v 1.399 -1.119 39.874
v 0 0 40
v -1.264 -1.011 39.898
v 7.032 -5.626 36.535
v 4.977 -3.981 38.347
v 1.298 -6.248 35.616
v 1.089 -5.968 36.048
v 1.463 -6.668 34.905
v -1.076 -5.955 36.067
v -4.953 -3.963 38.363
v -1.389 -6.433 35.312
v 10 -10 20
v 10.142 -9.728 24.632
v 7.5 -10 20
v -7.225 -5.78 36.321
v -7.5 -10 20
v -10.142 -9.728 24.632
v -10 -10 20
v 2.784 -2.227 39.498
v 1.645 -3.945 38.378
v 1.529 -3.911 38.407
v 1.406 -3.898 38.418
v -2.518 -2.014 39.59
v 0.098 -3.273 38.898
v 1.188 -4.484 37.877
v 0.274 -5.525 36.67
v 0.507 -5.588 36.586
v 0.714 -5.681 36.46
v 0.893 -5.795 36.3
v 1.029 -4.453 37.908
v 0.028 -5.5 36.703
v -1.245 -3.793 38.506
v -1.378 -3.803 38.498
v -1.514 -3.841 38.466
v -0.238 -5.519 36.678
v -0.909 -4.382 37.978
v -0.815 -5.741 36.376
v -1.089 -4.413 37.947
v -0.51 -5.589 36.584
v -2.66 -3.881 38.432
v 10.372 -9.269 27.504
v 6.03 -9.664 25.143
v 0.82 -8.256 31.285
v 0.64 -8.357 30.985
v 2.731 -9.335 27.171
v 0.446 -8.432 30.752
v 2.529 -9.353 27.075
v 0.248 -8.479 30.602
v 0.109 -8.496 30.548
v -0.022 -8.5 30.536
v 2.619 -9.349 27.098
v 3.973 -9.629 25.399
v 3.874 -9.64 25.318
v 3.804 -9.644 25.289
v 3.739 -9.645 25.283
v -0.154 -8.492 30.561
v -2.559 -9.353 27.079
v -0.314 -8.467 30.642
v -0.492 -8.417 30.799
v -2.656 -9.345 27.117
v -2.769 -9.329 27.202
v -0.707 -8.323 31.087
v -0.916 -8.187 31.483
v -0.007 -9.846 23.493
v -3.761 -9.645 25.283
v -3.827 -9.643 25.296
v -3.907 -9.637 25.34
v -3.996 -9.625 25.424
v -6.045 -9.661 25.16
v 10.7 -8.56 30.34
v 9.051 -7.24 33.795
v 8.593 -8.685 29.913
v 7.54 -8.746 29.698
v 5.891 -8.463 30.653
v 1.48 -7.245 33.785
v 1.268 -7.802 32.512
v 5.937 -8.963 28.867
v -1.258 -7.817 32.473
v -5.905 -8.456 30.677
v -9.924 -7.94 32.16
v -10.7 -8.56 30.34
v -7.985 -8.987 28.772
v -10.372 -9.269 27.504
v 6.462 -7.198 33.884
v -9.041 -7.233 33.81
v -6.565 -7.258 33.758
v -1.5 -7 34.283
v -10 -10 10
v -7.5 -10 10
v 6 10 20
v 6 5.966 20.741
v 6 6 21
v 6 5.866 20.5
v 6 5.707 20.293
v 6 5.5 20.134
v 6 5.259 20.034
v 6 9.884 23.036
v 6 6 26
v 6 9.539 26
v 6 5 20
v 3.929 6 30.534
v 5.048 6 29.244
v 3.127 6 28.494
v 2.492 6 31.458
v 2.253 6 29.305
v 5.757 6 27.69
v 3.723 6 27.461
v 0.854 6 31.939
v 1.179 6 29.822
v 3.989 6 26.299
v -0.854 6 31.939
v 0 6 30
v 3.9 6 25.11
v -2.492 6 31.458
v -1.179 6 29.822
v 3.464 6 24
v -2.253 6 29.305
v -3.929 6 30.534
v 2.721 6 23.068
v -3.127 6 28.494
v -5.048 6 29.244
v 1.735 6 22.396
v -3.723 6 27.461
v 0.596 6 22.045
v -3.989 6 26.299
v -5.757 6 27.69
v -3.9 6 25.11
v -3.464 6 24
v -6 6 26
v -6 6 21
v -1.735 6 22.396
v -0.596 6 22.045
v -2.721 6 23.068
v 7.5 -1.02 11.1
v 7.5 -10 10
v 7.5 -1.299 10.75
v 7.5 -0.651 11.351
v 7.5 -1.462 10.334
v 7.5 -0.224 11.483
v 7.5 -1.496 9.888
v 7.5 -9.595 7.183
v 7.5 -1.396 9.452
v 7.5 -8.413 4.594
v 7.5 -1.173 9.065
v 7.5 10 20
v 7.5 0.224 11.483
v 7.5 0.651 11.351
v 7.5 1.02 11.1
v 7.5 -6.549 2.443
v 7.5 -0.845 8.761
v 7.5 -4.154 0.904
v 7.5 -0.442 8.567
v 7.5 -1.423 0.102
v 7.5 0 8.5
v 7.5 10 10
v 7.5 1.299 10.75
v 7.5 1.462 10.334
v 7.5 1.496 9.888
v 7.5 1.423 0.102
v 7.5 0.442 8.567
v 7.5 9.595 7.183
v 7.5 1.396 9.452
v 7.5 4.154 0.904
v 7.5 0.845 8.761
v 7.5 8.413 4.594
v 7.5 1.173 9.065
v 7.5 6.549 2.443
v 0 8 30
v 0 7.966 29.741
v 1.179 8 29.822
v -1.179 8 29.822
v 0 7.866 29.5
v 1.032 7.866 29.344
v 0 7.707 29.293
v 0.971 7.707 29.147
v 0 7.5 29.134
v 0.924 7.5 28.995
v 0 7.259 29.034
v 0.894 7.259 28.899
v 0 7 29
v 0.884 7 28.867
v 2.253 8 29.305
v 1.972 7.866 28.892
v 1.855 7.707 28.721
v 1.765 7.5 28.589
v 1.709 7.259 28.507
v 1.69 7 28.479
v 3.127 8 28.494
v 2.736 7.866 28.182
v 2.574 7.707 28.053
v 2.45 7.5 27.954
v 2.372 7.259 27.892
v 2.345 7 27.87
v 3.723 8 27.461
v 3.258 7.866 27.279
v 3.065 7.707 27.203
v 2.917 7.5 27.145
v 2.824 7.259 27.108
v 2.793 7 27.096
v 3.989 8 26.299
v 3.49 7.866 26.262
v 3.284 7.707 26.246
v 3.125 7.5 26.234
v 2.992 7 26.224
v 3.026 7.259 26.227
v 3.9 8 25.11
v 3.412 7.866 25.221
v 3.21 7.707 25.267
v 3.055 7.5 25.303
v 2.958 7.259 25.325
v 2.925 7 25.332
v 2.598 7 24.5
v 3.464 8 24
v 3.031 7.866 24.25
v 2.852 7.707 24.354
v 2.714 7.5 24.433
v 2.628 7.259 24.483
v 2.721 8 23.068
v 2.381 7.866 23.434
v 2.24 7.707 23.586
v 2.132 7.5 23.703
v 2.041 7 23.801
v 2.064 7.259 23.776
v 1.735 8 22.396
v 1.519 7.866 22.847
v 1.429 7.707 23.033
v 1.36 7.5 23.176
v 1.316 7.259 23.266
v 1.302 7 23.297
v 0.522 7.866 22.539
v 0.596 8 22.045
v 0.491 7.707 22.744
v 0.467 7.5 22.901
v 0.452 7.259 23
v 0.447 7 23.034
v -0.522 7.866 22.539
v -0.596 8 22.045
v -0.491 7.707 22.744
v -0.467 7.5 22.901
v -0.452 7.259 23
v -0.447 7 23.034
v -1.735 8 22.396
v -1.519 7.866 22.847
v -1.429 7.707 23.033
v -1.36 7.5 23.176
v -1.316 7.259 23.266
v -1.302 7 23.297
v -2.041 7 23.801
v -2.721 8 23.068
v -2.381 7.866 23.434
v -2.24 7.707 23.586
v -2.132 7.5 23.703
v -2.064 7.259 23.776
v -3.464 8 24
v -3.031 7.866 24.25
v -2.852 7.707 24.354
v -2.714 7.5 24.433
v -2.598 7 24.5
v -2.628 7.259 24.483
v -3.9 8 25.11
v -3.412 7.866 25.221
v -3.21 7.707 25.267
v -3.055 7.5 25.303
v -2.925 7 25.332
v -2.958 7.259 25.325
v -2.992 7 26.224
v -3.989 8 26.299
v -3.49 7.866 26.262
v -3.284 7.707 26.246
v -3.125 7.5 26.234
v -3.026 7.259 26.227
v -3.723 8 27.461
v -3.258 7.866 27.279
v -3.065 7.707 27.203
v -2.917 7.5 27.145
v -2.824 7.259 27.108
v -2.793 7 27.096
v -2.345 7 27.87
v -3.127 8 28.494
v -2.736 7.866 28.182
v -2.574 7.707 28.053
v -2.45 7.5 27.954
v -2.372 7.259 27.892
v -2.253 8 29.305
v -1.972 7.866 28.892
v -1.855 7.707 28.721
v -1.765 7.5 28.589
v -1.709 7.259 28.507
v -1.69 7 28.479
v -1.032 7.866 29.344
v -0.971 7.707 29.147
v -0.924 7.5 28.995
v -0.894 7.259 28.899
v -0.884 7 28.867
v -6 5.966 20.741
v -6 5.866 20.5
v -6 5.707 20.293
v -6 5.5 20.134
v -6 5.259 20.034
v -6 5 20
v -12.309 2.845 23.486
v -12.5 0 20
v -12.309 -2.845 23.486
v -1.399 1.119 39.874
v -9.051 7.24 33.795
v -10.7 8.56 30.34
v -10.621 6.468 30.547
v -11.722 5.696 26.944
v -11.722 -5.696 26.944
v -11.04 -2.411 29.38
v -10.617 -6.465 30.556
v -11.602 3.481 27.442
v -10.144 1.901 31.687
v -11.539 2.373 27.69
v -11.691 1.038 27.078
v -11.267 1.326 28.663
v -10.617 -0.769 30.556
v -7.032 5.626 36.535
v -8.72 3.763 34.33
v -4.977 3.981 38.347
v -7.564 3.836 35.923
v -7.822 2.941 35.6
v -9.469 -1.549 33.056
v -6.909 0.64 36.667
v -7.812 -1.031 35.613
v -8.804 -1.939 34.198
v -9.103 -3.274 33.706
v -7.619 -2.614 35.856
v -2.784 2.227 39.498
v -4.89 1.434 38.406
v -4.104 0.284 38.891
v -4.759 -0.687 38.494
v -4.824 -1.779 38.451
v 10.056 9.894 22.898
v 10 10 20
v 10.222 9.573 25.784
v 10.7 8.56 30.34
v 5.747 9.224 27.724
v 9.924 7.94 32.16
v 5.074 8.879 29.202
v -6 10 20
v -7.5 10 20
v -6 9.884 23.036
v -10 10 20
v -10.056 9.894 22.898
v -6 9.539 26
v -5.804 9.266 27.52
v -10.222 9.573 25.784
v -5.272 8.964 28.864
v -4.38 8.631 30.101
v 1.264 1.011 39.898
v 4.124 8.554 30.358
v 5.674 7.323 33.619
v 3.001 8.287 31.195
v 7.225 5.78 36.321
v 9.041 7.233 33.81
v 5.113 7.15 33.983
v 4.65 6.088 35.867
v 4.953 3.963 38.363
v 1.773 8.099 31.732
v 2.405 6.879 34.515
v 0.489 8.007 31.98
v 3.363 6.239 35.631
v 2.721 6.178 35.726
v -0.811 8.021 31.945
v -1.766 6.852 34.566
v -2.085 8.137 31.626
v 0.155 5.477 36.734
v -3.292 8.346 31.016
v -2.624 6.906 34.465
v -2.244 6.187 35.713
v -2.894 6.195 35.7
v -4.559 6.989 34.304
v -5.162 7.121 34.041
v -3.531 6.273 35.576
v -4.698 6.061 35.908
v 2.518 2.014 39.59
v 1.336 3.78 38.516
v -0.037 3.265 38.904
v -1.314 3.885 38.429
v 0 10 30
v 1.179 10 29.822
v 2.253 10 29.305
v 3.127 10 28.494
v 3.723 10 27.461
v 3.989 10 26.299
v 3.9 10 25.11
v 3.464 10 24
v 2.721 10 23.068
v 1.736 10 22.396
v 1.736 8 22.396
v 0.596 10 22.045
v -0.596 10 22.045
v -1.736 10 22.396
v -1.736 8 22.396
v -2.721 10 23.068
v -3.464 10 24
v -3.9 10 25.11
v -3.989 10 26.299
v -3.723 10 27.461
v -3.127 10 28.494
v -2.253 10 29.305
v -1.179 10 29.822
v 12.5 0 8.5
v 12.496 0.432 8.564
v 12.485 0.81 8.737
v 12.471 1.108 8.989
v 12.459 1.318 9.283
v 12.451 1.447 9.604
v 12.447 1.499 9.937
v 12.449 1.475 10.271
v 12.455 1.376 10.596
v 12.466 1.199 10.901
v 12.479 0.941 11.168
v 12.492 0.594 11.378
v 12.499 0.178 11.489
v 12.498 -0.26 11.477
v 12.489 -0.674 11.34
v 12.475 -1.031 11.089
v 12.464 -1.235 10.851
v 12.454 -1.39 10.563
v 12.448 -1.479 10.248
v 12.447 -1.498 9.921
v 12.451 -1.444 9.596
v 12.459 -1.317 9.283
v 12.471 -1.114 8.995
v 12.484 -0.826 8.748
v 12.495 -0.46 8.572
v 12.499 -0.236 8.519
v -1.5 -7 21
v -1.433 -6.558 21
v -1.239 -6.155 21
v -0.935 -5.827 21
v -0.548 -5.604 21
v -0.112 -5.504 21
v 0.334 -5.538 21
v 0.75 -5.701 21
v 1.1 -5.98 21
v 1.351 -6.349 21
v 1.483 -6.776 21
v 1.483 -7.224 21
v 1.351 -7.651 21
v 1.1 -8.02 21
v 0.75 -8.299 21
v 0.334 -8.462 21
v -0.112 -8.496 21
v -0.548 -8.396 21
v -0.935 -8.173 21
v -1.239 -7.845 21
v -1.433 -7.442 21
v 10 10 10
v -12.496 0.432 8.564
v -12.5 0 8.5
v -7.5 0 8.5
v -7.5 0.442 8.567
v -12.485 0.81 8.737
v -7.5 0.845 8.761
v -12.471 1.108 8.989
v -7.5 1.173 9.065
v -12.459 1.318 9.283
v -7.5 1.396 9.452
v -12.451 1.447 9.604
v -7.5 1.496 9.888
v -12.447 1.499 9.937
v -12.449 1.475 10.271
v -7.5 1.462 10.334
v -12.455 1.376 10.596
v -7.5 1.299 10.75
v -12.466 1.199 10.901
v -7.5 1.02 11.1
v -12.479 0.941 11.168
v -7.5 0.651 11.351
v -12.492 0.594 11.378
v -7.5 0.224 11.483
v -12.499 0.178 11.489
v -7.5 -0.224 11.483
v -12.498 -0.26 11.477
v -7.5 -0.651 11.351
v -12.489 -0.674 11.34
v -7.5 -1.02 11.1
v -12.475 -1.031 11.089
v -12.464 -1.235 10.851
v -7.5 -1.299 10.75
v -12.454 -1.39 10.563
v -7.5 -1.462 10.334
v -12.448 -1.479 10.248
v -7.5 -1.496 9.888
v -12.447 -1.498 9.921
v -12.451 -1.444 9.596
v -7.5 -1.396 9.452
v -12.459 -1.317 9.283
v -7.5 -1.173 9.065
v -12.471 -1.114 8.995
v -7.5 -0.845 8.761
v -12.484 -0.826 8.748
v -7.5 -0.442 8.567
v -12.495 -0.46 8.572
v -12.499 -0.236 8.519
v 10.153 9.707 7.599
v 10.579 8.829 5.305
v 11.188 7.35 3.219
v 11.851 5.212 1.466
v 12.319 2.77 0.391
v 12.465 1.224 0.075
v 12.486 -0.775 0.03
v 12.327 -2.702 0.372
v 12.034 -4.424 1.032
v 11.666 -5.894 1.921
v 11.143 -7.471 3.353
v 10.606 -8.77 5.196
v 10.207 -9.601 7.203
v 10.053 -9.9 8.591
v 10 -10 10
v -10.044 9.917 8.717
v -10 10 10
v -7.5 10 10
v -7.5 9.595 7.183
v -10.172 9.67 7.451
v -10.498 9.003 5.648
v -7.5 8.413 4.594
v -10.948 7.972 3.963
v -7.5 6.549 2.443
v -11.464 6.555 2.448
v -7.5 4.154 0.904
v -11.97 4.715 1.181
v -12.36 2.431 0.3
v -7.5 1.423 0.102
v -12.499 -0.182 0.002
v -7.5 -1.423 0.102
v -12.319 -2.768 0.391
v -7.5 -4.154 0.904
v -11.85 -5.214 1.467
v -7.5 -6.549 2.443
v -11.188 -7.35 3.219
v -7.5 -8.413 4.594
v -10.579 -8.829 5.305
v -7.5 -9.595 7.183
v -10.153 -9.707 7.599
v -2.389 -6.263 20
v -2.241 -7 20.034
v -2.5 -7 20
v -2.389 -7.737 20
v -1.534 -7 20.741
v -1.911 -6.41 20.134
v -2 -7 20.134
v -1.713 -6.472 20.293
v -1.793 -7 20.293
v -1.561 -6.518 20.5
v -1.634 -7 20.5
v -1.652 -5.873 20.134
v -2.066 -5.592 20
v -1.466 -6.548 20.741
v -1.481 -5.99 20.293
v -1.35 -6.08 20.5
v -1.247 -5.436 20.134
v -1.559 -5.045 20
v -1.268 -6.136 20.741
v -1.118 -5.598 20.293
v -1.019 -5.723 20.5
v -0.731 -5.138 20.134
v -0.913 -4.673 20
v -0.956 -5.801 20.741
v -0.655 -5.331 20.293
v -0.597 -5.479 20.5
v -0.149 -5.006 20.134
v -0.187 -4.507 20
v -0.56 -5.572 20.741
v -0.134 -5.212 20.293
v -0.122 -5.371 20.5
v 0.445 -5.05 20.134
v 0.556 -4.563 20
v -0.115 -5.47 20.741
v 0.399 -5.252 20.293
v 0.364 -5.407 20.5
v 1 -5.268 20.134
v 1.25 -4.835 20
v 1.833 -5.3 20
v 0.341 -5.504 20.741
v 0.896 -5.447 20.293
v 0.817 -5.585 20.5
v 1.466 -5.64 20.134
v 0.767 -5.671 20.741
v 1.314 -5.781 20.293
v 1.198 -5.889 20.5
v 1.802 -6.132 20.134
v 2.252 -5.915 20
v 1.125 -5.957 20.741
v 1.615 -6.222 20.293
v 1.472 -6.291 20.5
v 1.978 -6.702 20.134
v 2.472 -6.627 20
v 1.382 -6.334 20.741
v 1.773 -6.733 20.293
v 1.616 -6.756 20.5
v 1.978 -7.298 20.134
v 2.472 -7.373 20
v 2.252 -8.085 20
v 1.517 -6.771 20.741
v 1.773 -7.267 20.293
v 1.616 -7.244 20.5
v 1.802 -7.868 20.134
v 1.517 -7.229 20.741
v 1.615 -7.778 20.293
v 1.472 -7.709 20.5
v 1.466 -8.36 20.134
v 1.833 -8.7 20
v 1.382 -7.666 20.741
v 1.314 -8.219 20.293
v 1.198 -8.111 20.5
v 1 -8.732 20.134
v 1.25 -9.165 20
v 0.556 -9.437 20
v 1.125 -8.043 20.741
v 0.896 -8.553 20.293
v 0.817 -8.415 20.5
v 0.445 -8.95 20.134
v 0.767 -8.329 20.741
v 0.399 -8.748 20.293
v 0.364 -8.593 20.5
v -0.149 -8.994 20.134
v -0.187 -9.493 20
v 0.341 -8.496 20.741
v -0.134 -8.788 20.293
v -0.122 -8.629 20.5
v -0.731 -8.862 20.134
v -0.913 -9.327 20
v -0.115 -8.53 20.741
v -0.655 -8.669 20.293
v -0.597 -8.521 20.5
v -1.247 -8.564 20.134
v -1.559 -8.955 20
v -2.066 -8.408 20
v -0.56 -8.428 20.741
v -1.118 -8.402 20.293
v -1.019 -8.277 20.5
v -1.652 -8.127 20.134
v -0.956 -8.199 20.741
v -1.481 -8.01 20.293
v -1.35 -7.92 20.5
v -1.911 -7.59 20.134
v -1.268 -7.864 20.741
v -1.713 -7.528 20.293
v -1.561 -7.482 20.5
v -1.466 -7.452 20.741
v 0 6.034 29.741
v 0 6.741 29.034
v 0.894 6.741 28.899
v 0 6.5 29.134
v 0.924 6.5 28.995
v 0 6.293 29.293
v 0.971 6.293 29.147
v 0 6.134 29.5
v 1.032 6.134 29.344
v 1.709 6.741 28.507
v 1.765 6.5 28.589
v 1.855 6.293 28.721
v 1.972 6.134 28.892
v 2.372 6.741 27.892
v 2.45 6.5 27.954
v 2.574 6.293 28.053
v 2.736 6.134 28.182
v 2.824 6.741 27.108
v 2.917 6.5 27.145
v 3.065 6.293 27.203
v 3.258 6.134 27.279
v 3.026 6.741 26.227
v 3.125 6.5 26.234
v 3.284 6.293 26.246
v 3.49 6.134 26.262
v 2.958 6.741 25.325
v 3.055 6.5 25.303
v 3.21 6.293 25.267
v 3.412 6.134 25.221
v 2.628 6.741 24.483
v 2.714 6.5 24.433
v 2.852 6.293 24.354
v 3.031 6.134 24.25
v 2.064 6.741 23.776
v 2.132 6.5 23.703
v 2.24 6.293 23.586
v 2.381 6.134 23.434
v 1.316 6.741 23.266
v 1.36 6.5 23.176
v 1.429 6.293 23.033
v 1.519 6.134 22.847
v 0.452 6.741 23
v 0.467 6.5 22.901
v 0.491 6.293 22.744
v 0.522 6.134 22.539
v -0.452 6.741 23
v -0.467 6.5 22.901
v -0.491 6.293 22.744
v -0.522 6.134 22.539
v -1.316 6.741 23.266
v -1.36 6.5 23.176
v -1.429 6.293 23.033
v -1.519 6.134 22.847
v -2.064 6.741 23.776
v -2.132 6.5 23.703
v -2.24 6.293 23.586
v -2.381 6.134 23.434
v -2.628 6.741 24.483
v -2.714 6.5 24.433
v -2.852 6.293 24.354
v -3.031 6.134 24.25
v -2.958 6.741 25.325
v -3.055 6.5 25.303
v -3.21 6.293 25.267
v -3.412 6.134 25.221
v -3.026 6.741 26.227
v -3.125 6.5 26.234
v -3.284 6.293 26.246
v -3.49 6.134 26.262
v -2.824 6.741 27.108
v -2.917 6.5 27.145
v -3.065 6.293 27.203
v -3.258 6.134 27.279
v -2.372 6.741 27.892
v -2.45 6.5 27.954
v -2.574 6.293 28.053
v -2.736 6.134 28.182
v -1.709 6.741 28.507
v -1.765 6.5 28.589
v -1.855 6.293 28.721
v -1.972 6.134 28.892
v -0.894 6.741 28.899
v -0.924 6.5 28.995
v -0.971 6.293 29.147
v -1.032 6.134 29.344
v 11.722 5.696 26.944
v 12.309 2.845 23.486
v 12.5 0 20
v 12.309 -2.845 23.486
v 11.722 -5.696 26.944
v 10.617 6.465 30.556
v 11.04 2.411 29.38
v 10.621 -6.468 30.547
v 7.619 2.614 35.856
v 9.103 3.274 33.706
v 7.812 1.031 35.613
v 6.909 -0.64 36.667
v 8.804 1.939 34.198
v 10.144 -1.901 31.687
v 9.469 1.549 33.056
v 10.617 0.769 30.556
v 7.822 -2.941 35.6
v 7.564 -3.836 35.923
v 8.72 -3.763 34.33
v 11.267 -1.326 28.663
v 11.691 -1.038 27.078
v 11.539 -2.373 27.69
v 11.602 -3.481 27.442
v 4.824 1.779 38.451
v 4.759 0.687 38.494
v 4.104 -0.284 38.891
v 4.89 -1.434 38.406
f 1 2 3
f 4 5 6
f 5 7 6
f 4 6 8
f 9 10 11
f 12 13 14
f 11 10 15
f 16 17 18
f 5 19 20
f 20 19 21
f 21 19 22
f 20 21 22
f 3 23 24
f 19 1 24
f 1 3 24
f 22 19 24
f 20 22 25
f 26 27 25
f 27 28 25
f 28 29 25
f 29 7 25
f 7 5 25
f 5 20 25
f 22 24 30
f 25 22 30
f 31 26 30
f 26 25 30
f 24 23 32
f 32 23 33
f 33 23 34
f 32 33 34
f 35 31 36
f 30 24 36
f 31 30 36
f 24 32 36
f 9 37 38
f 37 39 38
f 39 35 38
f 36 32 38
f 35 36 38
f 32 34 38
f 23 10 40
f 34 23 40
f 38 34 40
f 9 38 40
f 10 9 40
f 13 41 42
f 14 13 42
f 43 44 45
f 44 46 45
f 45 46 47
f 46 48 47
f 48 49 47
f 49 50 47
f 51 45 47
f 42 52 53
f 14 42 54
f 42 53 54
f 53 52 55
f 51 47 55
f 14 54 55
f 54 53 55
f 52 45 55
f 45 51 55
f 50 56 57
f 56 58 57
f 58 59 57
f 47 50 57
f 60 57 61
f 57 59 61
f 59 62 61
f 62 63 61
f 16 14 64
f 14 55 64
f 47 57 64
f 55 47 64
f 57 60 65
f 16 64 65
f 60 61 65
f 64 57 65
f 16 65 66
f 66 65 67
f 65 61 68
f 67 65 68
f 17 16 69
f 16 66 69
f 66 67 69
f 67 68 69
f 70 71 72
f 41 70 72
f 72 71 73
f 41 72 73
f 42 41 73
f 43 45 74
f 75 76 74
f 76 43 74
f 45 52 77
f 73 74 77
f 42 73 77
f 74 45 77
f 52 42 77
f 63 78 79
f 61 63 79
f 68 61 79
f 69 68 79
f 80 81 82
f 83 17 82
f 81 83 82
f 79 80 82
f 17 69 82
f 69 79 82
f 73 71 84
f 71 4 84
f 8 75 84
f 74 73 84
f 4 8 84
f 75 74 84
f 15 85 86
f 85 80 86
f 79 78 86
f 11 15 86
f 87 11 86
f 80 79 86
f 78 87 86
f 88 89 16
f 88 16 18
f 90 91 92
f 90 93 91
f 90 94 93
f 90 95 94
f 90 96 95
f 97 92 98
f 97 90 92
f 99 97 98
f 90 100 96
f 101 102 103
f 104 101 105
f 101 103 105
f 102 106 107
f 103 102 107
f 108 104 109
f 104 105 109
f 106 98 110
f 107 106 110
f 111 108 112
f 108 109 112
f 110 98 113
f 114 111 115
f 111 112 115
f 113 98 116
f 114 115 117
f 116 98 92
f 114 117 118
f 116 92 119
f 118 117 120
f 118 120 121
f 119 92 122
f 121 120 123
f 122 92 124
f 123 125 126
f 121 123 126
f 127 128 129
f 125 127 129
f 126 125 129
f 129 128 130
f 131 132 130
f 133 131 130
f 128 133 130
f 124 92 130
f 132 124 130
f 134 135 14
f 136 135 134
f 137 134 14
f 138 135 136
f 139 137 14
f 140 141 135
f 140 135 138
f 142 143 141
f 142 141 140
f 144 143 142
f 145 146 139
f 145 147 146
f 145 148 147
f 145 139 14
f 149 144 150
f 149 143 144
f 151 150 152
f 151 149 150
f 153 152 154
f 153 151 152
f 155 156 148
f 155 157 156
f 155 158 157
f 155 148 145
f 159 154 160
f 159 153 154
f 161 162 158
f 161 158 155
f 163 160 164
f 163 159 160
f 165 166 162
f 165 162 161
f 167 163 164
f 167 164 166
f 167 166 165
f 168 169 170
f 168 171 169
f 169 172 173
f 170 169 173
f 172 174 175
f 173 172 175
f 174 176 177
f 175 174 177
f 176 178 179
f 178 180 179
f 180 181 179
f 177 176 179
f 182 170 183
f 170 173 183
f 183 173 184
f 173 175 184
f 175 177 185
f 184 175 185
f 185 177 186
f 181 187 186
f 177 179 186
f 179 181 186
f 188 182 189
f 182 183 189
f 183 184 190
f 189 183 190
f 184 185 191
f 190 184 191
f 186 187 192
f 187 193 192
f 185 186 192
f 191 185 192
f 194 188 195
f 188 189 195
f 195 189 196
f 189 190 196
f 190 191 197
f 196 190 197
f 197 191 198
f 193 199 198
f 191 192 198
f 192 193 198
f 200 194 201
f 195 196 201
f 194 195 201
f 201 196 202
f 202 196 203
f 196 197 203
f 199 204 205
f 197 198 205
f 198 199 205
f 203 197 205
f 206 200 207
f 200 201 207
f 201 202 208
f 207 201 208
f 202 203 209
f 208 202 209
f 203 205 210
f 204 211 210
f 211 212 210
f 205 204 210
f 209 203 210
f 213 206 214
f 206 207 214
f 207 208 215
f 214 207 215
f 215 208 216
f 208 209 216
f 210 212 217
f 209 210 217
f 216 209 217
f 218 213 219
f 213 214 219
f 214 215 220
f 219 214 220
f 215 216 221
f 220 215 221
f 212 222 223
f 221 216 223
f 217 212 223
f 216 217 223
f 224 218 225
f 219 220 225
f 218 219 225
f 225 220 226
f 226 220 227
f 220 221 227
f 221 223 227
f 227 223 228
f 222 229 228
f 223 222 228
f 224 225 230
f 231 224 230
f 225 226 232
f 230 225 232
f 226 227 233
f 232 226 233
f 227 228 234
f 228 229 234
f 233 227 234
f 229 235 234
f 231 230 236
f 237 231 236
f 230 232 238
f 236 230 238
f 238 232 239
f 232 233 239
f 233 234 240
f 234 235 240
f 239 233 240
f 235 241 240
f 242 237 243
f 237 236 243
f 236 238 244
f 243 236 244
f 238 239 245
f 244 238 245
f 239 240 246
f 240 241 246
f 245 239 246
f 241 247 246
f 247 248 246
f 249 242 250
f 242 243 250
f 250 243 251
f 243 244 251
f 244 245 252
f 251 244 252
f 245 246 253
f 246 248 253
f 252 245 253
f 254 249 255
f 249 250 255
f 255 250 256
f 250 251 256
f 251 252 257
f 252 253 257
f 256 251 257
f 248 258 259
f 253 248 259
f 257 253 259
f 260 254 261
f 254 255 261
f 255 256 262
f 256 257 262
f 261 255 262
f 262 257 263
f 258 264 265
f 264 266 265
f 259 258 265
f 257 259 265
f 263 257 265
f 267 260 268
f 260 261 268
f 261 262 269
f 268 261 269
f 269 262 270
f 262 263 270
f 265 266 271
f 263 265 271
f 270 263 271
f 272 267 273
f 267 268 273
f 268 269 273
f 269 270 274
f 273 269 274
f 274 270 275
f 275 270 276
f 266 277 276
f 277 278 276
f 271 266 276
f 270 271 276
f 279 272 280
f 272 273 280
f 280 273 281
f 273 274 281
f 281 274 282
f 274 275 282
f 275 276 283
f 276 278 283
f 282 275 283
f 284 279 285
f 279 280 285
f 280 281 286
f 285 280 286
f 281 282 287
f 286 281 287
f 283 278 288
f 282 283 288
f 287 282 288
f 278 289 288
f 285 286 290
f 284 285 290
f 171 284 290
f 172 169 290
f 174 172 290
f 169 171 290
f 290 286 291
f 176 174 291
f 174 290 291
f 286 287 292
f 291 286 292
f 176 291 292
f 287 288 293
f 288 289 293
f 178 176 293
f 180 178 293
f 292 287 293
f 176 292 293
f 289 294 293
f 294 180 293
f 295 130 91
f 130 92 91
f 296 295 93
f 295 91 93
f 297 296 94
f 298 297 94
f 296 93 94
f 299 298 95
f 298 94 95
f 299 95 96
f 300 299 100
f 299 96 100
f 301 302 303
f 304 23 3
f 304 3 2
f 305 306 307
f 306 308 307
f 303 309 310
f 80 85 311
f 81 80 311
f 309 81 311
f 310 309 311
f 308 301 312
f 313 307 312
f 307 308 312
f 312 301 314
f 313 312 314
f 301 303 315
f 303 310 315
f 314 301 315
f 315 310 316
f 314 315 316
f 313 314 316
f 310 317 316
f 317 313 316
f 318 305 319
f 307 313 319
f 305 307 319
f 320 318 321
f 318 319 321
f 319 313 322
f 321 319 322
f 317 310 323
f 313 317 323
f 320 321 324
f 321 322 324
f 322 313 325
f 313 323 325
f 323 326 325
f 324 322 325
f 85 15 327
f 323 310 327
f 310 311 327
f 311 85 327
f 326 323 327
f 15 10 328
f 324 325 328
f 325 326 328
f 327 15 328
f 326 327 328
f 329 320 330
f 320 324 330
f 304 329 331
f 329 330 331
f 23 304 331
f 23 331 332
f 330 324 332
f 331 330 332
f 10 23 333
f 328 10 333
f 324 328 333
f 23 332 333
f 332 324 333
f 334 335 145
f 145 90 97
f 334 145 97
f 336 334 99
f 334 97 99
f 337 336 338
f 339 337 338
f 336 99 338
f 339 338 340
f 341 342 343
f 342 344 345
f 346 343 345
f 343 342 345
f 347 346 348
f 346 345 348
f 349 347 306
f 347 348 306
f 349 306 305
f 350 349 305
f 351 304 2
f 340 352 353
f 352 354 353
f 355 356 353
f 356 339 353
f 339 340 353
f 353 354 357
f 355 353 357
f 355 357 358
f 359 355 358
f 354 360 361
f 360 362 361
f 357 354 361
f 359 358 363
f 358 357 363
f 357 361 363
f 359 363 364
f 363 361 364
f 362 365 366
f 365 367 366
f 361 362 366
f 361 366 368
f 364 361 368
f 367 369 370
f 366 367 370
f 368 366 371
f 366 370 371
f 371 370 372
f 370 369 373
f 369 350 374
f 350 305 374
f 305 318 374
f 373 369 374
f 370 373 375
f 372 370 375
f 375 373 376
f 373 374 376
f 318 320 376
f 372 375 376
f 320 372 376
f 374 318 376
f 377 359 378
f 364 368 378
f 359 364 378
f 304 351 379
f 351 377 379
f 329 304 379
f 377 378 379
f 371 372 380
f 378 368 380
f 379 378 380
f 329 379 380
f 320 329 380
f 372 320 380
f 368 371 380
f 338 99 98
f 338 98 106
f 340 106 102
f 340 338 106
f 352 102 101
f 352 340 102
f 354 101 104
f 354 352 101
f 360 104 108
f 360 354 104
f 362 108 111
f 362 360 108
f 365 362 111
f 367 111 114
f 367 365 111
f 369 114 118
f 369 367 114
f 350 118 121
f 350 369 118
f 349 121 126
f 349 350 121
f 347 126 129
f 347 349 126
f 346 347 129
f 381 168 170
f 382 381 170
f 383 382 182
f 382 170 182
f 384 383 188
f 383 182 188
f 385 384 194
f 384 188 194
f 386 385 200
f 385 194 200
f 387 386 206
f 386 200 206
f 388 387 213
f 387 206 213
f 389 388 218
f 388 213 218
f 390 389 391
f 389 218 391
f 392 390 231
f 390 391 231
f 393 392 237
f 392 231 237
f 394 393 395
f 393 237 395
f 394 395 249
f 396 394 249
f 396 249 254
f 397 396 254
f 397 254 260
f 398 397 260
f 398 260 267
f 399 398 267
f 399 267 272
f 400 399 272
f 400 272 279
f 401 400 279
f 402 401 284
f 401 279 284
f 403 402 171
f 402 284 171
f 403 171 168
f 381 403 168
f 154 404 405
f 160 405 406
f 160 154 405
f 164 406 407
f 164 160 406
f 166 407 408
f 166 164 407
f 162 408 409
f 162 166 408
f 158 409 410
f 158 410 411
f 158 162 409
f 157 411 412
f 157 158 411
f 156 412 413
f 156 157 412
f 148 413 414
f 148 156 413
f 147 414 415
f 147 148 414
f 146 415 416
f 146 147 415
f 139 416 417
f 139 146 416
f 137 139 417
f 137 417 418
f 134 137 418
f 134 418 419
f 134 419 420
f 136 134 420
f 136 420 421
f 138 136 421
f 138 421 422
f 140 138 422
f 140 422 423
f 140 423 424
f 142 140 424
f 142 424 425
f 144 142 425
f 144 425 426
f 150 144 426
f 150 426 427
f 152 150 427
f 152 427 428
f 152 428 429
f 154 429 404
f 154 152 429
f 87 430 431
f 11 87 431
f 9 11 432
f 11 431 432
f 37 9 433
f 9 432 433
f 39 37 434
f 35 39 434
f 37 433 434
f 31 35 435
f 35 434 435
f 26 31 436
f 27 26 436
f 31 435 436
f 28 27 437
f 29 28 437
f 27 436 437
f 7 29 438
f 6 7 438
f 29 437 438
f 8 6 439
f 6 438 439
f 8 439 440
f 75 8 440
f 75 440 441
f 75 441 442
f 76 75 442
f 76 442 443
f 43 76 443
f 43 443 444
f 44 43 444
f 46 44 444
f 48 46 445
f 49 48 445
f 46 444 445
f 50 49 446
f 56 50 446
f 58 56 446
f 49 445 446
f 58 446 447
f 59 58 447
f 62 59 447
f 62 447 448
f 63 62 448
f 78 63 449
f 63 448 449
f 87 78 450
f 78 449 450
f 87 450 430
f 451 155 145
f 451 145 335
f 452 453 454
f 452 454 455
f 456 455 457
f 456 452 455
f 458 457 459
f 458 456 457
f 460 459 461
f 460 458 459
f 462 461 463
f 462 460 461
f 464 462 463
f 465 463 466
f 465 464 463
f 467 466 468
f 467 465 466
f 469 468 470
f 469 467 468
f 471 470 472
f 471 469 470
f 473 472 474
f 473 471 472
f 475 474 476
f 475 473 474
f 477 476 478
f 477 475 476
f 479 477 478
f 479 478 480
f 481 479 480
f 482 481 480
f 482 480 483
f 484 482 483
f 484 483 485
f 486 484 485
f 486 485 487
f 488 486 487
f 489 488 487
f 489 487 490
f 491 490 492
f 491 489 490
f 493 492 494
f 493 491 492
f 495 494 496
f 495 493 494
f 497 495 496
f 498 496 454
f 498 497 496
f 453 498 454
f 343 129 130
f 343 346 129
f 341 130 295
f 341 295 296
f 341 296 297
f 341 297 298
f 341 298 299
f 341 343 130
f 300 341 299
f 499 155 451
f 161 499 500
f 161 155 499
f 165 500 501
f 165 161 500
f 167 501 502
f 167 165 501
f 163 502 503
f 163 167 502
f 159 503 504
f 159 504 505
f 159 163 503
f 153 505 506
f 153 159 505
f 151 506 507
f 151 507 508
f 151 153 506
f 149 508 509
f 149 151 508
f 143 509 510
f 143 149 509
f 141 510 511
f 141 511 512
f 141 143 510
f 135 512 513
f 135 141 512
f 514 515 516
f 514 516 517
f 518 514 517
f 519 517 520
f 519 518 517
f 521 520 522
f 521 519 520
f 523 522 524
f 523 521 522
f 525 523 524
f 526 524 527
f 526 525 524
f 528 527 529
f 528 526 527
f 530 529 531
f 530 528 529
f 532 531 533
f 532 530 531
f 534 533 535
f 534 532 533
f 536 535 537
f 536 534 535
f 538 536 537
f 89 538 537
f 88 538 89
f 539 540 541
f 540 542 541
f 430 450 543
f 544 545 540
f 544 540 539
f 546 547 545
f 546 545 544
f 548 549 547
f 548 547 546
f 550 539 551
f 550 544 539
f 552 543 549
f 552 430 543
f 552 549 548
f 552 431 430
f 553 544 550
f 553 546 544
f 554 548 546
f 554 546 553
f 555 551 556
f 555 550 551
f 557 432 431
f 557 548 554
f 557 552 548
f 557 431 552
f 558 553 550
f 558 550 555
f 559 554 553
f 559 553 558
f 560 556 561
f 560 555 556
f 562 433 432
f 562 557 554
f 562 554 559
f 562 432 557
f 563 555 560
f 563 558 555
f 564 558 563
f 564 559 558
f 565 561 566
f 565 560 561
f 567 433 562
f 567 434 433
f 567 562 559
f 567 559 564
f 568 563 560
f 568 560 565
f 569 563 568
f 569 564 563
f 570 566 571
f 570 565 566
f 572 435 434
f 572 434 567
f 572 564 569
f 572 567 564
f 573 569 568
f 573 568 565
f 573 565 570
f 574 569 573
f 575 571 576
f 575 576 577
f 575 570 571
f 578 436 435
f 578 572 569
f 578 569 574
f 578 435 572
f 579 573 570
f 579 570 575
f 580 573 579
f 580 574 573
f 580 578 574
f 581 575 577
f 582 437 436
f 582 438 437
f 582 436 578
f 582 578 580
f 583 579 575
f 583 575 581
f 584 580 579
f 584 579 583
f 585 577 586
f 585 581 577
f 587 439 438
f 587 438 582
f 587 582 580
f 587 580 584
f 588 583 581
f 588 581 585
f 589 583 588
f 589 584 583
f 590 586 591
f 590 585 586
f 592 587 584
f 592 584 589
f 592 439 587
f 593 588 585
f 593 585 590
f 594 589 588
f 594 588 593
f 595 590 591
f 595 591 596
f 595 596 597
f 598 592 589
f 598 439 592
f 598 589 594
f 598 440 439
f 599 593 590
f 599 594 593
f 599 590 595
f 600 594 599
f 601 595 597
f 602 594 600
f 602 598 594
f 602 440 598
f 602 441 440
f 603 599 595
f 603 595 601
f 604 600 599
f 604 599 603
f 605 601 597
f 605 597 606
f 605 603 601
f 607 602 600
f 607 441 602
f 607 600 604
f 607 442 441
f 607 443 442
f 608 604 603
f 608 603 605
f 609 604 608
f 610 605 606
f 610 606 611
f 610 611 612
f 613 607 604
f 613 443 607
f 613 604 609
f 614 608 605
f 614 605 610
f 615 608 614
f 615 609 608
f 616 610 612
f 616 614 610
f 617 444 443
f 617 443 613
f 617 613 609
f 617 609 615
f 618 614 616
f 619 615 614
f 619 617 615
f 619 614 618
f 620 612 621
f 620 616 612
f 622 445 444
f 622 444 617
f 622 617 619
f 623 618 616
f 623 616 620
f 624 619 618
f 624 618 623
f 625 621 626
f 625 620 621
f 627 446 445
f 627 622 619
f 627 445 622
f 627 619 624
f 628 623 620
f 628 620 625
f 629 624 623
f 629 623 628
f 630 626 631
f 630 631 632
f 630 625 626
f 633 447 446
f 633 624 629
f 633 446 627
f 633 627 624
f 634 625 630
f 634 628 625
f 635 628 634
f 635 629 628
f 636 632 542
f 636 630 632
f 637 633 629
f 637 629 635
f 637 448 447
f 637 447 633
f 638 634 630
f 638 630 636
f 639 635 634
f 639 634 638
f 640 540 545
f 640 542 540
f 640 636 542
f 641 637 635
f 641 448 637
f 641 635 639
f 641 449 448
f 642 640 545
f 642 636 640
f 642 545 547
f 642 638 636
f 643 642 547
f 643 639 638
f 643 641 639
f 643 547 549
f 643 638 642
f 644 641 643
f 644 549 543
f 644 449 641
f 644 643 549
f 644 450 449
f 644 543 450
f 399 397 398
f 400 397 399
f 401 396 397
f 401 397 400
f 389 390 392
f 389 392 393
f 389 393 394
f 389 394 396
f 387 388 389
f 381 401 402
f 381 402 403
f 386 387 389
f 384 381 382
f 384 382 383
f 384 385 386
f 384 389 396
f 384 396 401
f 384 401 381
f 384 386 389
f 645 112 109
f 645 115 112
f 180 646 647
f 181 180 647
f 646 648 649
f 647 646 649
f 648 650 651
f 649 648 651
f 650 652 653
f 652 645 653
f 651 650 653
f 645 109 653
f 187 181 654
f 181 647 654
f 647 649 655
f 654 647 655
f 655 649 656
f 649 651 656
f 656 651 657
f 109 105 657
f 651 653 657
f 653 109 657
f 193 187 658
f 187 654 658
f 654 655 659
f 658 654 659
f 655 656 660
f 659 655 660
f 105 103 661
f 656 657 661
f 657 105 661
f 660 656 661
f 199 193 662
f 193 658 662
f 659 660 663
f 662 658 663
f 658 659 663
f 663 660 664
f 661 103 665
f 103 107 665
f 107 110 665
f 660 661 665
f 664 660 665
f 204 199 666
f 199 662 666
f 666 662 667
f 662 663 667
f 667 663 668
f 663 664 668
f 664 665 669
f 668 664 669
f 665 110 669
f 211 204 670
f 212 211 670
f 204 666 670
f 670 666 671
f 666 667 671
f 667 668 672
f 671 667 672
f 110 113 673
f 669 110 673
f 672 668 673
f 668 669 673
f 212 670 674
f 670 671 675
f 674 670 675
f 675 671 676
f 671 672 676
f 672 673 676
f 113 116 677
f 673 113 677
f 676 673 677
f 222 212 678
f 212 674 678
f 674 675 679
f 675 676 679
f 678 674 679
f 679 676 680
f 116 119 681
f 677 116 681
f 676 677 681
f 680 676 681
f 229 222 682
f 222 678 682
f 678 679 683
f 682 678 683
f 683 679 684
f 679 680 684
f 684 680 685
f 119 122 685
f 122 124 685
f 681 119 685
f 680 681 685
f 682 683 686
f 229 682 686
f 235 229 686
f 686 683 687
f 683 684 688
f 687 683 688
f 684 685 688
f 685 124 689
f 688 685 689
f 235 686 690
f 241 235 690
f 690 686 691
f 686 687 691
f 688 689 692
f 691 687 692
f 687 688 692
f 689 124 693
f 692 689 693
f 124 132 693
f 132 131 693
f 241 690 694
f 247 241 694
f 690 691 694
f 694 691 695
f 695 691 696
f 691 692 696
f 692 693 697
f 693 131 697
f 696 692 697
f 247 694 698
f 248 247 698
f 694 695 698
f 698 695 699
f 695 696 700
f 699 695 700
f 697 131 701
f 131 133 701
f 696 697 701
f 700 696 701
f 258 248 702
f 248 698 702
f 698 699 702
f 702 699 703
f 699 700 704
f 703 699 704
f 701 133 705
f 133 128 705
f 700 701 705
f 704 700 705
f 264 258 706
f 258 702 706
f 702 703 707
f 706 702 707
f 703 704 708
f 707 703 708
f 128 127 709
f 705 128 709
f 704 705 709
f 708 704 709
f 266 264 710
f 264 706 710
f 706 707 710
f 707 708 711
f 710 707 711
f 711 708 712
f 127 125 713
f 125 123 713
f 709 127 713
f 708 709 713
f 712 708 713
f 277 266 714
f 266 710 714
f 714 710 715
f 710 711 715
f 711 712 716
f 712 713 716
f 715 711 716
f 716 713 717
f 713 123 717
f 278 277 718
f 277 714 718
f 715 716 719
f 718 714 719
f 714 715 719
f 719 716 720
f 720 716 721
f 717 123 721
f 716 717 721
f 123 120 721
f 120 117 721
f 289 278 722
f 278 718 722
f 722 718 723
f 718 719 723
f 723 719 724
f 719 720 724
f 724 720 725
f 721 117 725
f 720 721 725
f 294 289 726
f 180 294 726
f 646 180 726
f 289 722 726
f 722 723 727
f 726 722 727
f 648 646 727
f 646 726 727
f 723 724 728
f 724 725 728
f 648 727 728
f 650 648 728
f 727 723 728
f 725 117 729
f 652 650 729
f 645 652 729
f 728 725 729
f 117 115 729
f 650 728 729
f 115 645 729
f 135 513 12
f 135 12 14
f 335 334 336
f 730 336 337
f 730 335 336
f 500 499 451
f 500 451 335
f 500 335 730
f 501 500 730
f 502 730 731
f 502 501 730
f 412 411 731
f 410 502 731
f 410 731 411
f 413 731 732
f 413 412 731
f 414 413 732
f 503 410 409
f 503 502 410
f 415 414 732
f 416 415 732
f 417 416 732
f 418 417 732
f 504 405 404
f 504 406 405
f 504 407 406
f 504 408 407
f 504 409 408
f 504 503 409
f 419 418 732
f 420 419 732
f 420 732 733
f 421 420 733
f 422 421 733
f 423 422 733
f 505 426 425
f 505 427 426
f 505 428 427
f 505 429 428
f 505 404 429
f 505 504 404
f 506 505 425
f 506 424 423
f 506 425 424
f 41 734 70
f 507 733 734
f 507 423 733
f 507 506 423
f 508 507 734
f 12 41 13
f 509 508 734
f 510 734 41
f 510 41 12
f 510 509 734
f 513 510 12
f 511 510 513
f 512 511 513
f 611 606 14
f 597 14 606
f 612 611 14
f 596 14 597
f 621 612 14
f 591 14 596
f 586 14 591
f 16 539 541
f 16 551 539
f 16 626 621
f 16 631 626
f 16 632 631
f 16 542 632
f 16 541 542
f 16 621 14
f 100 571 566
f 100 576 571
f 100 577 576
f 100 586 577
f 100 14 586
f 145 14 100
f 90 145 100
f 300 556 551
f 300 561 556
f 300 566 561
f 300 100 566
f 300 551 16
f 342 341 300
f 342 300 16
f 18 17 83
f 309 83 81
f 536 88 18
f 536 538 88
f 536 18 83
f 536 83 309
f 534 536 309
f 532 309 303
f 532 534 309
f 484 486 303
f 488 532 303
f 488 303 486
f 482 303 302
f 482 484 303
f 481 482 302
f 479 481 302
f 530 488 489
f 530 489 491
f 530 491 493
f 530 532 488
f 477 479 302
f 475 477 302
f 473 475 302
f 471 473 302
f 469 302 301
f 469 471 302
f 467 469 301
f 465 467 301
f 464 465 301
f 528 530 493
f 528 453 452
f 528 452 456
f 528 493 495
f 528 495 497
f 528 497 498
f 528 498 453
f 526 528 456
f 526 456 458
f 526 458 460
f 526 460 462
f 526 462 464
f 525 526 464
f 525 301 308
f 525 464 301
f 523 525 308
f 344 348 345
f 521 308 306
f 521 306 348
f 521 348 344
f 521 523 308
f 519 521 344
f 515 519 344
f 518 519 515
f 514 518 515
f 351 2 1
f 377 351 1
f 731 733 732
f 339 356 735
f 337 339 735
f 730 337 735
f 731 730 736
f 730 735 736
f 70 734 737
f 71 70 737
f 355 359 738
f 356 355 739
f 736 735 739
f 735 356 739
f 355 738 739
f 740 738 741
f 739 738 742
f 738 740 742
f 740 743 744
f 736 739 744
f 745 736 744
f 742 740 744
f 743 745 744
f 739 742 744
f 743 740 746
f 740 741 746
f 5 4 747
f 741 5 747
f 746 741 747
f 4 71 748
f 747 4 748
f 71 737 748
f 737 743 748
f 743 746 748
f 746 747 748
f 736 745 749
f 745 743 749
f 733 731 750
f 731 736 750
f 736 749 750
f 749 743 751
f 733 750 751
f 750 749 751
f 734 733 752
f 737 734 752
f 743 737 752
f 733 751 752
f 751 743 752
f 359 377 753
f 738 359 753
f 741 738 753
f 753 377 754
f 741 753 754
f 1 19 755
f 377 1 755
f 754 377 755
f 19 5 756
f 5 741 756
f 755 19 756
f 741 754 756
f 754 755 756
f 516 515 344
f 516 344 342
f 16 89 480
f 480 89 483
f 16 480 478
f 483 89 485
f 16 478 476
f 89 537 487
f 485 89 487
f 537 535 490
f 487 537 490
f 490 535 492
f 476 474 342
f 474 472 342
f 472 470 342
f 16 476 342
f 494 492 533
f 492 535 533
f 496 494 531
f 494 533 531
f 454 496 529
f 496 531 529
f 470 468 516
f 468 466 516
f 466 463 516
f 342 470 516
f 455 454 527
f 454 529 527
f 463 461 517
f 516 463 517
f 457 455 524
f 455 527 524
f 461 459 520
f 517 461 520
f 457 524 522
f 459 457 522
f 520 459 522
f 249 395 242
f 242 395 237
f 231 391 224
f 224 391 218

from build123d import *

# Parameters (mm, degrees)
SALIENTE_EXTRUIR1_DEPTH    = 40
CROQUIS3_R                 = 1.5
CORTAR_EXTRUIR2_DEPTH      = 40
CROQUIS2_W                 = 15
CROQUIS2_H                 = 20
CORTAR_EXTRUIR1_DEPTH      = 20
CORTAR_EXTRUIR3_DEPTH      = 44.084219849
CORTAR_EXTRUIR3_DEPTH_BACK = 44.084219849
CROQUIS4_R                 = 1.5
CORTAR_EXTRUIR4_DEPTH      = 44.08422
CORTAR_EXTRUIR4_DEPTH_BACK = 44.08422
CORTAR_EXTRUIR5_DEPTH      = 44.084220001
CORTAR_EXTRUIR5_DEPTH_BACK = 44.084220001
CUT_EXTRUDE1_DEPTH         = 4
SKETCH2_R                  = 3
BOSS_EXTRUDE1_DEPTH        = 2
SKETCH3_R                  = 4
BOSS_EXTRUDE2_DEPTH        = 2
FILLET1_R                  = 1
FILLET2_R                  = 1
FILLET3_R                  = 1


with BuildPart() as part:
    # Croquis1 → Saliente-Extruir1 (new body)
    with BuildSketch(Plane.XY):
        with BuildLine():
            Line((-10, 10), (10, 10))
            ThreePointArc((10, 10), (12.5, 0), (10, -10))
            Line((10, -10), (-10, -10))
            ThreePointArc((-10, -10), (-12.5, 0), (-10, 10))
        make_face()
    extrude(amount=SALIENTE_EXTRUIR1_DEPTH)

    # Croquis3 → Cortar-Extruir2 (cut)
    with BuildSketch(Plane(origin=(0, 0, 0), x_dir=(-1, 0, 0), z_dir=(0, 0, -1))):
        with Locations((0, -7)):
            Circle(CROQUIS3_R)
    extrude(amount=-CORTAR_EXTRUIR2_DEPTH, mode=Mode.SUBTRACT)

    # Croquis2 → Cortar-Extruir1 (cut)
    with BuildSketch(Plane(origin=(0, 0, 0), x_dir=(-1, 0, 0), z_dir=(0, 0, -1))):
        Rectangle(CROQUIS2_W, CROQUIS2_H)
    extrude(amount=-CORTAR_EXTRUIR1_DEPTH, mode=Mode.SUBTRACT)

    # Croquis4 → Cortar-Extruir3 (cut, two sides: drawn at the far end of the back side and taken through both)
    with BuildSketch(Plane(origin=(0, 0, 0), x_dir=(0, 0, -1), z_dir=(1, 0, 0)).offset(-CORTAR_EXTRUIR3_DEPTH_BACK)):
        with Locations((-10, 0)):
            Circle(CROQUIS4_R)
        with BuildLine():
            Line((-10, -10), (3, -10))
            Line((3, -10), (3, 10))
            Line((3, 10), (-10, 10))
            ThreePointArc((-10, 10), (0, 0), (-10, -10))
        make_face()
    extrude(amount=CORTAR_EXTRUIR3_DEPTH + CORTAR_EXTRUIR3_DEPTH_BACK, mode=Mode.SUBTRACT)

    # Croquis5 → Cortar-Extruir4 (cut, two sides: drawn at the far end of the back side and taken through both)
    with BuildSketch(Plane(origin=(0, 0, 0), x_dir=(1, 0, 0), z_dir=(0, 1, 0)).offset(-CORTAR_EXTRUIR4_DEPTH_BACK)):
        with BuildLine():
            Line((-12.5, -20), (-12.5, -42))
            Line((-12.5, -42), (12.5, -42))
            Line((12.5, -42), (12.5, -20))
            add(Edge.make_bspline(
                [(-12.5, -20), (-12.5, -40), (0, -40), (12.5, -40), (12.5, -20)],
                knots=[4.71238898, 4.71238898, 4.71238898, 6.283185307, 6.283185307, 7.853981634, 7.853981634, 7.853981634], degree=2, weights=[1, 0.707106781, 1, 0.707106781, 1]))
        make_face()
    extrude(amount=CORTAR_EXTRUIR4_DEPTH + CORTAR_EXTRUIR4_DEPTH_BACK, mode=Mode.SUBTRACT)

    # Croquis6 → Cortar-Extruir5 (cut, two sides: drawn at the far end of the back side and taken through both)
    with BuildSketch(Plane(origin=(0, 0, 0), x_dir=(0, 0, -1), z_dir=(1, 0, 0)).offset(-CORTAR_EXTRUIR5_DEPTH_BACK)):
        with BuildLine():
            Line((-20, 10), (-42, 10))
            Line((-42, 10), (-42, -10))
            Line((-42, -10), (-20, -10))
            add(Edge.make_bspline(
                [(-20, 10), (-40, 10), (-40, 0), (-40, -10), (-20, -10)],
                knots=[4.71238898, 4.71238898, 4.71238898, 6.283185307, 6.283185307, 7.853981634, 7.853981634, 7.853981634], degree=2, weights=[1, 0.707106781, 1, 0.707106781, 1]))
        make_face()
    extrude(amount=CORTAR_EXTRUIR5_DEPTH + CORTAR_EXTRUIR5_DEPTH_BACK, mode=Mode.SUBTRACT)

    # Sketch1 → Cut-Extrude1 (cut)
    with BuildSketch(Plane(origin=(0, 10, 0), x_dir=(1, 0, 0), z_dir=(0, 1, 0))):
        with BuildLine():
            Line((-6, -26), (-6, -20))
            Line((-6, -20), (6, -20))
            Line((6, -20), (6, -26))
            ThreePointArc((6, -26), (0, -32), (-6, -26))
        make_face()
    extrude(amount=-CUT_EXTRUDE1_DEPTH, mode=Mode.SUBTRACT)

    # Sketch2 → Boss-Extrude1 (add)
    with BuildSketch(Plane(origin=(0, 6, 0), x_dir=(1, 0, 0), z_dir=(0, 1, 0))):
        with Locations(Location((0, -26, 0), (0, 0, 270))):
            Circle(SKETCH2_R)
    extrude(amount=BOSS_EXTRUDE1_DEPTH)

    # Sketch3 → Boss-Extrude2 (add)
    with BuildSketch(Plane(origin=(0, 8, 0), x_dir=(1, 0, 0), z_dir=(0, 1, 0))):
        with Locations(Location((0, -26, 0), (0, 0, 270))):
            Circle(SKETCH3_R)
    extrude(amount=BOSS_EXTRUDE2_DEPTH)

    # Fillet1
    fillet1_edges = [part.edges().sort_by_distance(p)[0] for p in [
        (0, 6, 23),
        (0, 8, 23),
    ]]
    fillet(fillet1_edges, radius=FILLET1_R - 0.0001)  # a hair under: the kernel refuses the full size

    # Fillet2
    fillet2_edges = [part.edges().sort_by_distance(p)[0] for p in [
        (0, 6, 20),
    ]]
    fillet(fillet2_edges, radius=FILLET2_R)

    # Fillet3
    fillet3_edges = [part.edges().sort_by_distance(p)[0] for p in [
        (1.5, -7, 20),
    ]]
    fillet(fillet3_edges, radius=FILLET3_R)


solid = part.part
